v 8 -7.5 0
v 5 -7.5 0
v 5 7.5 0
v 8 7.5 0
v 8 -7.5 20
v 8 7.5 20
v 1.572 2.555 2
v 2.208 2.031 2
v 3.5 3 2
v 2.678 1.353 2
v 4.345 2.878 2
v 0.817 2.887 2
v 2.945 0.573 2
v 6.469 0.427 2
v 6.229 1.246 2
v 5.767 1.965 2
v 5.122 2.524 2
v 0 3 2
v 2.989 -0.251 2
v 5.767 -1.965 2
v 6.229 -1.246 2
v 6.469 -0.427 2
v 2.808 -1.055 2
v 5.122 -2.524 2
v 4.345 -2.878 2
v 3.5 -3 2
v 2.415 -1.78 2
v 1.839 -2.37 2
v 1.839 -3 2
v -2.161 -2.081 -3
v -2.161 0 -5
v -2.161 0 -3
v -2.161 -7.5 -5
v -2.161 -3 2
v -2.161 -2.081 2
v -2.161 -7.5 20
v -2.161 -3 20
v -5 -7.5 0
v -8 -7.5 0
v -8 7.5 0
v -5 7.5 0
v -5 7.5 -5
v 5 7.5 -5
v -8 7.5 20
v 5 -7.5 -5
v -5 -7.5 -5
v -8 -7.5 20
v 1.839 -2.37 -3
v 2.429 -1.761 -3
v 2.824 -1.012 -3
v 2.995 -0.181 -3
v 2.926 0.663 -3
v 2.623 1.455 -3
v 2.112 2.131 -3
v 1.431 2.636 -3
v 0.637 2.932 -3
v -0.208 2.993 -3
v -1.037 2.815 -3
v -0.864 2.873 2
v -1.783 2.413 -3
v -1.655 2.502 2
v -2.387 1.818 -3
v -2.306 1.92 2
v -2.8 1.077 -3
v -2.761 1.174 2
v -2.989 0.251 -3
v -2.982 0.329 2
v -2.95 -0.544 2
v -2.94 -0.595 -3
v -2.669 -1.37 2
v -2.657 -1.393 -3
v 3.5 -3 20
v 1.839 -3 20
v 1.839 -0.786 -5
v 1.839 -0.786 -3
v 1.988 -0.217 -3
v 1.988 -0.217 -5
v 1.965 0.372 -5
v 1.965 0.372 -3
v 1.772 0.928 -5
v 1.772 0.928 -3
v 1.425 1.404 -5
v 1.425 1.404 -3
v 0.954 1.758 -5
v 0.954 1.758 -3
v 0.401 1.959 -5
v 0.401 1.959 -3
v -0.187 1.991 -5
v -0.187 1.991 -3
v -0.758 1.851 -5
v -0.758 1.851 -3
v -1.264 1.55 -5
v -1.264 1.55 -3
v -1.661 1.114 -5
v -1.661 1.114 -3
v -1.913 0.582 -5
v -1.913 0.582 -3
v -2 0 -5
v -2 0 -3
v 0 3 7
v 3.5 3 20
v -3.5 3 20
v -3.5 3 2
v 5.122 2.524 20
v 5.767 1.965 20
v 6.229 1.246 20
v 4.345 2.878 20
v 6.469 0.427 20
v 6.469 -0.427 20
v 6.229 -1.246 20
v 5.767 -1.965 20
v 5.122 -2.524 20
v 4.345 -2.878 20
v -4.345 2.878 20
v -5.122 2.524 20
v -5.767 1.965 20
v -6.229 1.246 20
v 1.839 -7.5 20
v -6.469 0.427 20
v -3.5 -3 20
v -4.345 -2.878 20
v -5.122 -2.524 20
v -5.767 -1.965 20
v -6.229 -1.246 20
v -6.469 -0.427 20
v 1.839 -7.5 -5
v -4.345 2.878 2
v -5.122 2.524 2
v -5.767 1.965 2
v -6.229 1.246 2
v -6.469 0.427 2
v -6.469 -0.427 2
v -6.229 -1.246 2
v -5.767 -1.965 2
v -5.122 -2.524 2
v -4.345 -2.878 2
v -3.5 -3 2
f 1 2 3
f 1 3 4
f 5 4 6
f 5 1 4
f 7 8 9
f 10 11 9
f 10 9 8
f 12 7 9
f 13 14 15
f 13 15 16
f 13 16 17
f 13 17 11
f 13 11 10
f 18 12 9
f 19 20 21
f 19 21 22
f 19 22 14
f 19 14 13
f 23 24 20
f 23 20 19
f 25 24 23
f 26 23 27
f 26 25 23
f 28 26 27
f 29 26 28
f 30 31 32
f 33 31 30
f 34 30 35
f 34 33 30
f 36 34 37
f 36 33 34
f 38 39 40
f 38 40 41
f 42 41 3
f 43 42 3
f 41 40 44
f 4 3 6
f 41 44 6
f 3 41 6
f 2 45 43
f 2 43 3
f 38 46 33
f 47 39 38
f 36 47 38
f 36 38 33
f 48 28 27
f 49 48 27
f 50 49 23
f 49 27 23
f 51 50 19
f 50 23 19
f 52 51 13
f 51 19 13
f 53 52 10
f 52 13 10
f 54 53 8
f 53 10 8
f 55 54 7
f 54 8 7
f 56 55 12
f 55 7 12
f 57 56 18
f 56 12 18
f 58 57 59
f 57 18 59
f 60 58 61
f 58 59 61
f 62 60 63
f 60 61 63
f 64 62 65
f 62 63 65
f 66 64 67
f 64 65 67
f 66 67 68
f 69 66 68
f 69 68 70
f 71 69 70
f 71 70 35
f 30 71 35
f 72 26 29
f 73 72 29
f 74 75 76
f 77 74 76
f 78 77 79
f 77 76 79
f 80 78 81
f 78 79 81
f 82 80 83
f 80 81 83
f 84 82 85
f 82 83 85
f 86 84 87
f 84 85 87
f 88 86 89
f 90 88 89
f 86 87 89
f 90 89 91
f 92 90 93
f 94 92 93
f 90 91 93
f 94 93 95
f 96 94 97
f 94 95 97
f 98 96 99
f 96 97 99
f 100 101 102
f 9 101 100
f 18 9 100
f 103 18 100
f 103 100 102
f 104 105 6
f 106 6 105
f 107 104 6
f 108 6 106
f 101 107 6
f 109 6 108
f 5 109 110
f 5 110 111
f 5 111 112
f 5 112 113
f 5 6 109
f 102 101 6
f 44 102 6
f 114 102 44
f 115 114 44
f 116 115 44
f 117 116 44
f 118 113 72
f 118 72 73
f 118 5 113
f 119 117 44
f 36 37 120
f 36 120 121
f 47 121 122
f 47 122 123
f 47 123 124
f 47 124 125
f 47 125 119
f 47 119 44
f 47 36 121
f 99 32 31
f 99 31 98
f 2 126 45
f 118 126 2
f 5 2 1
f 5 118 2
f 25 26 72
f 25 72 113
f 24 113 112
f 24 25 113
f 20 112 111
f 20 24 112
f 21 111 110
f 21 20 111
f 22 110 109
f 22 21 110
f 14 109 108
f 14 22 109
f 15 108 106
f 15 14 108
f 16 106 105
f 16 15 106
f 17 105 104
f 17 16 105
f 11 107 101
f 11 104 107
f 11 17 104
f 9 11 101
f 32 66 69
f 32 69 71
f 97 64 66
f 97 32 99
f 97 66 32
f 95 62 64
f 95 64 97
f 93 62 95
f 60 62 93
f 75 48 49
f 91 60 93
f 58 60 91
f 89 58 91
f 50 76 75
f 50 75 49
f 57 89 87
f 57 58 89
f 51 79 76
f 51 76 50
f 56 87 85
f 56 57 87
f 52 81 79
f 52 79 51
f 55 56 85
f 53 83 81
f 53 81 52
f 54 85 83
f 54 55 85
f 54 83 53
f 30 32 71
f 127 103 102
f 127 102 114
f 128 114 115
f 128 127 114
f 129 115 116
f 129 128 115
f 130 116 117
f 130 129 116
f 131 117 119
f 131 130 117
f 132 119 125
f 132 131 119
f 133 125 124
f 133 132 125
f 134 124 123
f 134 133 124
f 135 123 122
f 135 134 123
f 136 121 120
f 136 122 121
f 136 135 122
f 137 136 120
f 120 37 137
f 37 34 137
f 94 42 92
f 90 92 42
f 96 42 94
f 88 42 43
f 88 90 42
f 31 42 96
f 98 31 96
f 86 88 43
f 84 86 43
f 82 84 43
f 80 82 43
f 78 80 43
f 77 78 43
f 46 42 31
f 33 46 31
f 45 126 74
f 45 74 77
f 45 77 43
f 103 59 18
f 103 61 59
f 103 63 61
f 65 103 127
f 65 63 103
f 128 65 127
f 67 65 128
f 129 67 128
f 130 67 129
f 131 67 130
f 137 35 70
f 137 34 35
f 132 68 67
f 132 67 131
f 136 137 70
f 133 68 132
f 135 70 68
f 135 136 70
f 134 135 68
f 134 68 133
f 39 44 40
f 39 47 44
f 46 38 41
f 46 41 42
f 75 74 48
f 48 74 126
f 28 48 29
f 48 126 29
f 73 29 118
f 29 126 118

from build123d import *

# Parameters (mm, degrees)
SKETCH004_W  = 4
SKETCH004_H  = 60
PAD004_DEPTH = 7.5
PAD005_DEPTH = 30
SKETCH002_R  = 3
PAD006_DEPTH = 5
SKETCH003_R  = 2
PAD003_DEPTH = 40
PAD_DEPTH    = 7.5


with BuildPart() as pad004:
    # Sketch004 → Pad004 (new body, symmetric)
    with BuildSketch(Plane.XZ.offset(7.5)):
        with Locations((-0.160987, 0)):
            Rectangle(SKETCH004_W, SKETCH004_H)
    extrude(amount=PAD004_DEPTH, both=True)


with BuildPart() as pad005:
    # Sketch001 → Pad005 (new body)
    with BuildSketch(Plane(origin=(0, 0, 2), x_dir=(-1, 0, 0), z_dir=(0, 0, 1))):
        with BuildLine():
            ThreePointArc((-3.5, 3), (-6.5, 0), (-3.5, -3))
            Line((-3.5, -3), (3.5, -3))
            ThreePointArc((3.5, -3), (6.5, 0), (3.5, 3))
            Line((-3.5, 3), (3.5, 3))
        make_face()
    extrude(amount=PAD005_DEPTH)


with BuildPart() as pad006:
    # Sketch002 → Pad006 (new body, symmetric)
    with BuildSketch(Plane.XY.offset(2)):
        Circle(SKETCH002_R)
    extrude(amount=PAD006_DEPTH, both=True)


with BuildPart() as fusion:
    # Sketch003 → Pad003 (new body, symmetric)
    with BuildSketch(Plane.XY.offset(2)):
        Circle(SKETCH003_R)
    extrude(amount=PAD003_DEPTH, both=True)

    # Fusion: union Pad004, Pad005, Pad006
    add(pad004.part)
    add(pad005.part)
    add(pad006.part)


with BuildPart() as cut:
    # Sketch → Pad (new body, symmetric)
    with BuildSketch(Plane.XZ):
        Polygon((-8, 20), (-8, 0), (-5, 0), (-5, -5), (5, -5), (5, 0), (8, 0), (8, 20), align=None)
    extrude(amount=PAD_DEPTH, both=True)

    # Cut: cut Fusion
    add(fusion.part, mode=Mode.SUBTRACT)


solid = cut.part
